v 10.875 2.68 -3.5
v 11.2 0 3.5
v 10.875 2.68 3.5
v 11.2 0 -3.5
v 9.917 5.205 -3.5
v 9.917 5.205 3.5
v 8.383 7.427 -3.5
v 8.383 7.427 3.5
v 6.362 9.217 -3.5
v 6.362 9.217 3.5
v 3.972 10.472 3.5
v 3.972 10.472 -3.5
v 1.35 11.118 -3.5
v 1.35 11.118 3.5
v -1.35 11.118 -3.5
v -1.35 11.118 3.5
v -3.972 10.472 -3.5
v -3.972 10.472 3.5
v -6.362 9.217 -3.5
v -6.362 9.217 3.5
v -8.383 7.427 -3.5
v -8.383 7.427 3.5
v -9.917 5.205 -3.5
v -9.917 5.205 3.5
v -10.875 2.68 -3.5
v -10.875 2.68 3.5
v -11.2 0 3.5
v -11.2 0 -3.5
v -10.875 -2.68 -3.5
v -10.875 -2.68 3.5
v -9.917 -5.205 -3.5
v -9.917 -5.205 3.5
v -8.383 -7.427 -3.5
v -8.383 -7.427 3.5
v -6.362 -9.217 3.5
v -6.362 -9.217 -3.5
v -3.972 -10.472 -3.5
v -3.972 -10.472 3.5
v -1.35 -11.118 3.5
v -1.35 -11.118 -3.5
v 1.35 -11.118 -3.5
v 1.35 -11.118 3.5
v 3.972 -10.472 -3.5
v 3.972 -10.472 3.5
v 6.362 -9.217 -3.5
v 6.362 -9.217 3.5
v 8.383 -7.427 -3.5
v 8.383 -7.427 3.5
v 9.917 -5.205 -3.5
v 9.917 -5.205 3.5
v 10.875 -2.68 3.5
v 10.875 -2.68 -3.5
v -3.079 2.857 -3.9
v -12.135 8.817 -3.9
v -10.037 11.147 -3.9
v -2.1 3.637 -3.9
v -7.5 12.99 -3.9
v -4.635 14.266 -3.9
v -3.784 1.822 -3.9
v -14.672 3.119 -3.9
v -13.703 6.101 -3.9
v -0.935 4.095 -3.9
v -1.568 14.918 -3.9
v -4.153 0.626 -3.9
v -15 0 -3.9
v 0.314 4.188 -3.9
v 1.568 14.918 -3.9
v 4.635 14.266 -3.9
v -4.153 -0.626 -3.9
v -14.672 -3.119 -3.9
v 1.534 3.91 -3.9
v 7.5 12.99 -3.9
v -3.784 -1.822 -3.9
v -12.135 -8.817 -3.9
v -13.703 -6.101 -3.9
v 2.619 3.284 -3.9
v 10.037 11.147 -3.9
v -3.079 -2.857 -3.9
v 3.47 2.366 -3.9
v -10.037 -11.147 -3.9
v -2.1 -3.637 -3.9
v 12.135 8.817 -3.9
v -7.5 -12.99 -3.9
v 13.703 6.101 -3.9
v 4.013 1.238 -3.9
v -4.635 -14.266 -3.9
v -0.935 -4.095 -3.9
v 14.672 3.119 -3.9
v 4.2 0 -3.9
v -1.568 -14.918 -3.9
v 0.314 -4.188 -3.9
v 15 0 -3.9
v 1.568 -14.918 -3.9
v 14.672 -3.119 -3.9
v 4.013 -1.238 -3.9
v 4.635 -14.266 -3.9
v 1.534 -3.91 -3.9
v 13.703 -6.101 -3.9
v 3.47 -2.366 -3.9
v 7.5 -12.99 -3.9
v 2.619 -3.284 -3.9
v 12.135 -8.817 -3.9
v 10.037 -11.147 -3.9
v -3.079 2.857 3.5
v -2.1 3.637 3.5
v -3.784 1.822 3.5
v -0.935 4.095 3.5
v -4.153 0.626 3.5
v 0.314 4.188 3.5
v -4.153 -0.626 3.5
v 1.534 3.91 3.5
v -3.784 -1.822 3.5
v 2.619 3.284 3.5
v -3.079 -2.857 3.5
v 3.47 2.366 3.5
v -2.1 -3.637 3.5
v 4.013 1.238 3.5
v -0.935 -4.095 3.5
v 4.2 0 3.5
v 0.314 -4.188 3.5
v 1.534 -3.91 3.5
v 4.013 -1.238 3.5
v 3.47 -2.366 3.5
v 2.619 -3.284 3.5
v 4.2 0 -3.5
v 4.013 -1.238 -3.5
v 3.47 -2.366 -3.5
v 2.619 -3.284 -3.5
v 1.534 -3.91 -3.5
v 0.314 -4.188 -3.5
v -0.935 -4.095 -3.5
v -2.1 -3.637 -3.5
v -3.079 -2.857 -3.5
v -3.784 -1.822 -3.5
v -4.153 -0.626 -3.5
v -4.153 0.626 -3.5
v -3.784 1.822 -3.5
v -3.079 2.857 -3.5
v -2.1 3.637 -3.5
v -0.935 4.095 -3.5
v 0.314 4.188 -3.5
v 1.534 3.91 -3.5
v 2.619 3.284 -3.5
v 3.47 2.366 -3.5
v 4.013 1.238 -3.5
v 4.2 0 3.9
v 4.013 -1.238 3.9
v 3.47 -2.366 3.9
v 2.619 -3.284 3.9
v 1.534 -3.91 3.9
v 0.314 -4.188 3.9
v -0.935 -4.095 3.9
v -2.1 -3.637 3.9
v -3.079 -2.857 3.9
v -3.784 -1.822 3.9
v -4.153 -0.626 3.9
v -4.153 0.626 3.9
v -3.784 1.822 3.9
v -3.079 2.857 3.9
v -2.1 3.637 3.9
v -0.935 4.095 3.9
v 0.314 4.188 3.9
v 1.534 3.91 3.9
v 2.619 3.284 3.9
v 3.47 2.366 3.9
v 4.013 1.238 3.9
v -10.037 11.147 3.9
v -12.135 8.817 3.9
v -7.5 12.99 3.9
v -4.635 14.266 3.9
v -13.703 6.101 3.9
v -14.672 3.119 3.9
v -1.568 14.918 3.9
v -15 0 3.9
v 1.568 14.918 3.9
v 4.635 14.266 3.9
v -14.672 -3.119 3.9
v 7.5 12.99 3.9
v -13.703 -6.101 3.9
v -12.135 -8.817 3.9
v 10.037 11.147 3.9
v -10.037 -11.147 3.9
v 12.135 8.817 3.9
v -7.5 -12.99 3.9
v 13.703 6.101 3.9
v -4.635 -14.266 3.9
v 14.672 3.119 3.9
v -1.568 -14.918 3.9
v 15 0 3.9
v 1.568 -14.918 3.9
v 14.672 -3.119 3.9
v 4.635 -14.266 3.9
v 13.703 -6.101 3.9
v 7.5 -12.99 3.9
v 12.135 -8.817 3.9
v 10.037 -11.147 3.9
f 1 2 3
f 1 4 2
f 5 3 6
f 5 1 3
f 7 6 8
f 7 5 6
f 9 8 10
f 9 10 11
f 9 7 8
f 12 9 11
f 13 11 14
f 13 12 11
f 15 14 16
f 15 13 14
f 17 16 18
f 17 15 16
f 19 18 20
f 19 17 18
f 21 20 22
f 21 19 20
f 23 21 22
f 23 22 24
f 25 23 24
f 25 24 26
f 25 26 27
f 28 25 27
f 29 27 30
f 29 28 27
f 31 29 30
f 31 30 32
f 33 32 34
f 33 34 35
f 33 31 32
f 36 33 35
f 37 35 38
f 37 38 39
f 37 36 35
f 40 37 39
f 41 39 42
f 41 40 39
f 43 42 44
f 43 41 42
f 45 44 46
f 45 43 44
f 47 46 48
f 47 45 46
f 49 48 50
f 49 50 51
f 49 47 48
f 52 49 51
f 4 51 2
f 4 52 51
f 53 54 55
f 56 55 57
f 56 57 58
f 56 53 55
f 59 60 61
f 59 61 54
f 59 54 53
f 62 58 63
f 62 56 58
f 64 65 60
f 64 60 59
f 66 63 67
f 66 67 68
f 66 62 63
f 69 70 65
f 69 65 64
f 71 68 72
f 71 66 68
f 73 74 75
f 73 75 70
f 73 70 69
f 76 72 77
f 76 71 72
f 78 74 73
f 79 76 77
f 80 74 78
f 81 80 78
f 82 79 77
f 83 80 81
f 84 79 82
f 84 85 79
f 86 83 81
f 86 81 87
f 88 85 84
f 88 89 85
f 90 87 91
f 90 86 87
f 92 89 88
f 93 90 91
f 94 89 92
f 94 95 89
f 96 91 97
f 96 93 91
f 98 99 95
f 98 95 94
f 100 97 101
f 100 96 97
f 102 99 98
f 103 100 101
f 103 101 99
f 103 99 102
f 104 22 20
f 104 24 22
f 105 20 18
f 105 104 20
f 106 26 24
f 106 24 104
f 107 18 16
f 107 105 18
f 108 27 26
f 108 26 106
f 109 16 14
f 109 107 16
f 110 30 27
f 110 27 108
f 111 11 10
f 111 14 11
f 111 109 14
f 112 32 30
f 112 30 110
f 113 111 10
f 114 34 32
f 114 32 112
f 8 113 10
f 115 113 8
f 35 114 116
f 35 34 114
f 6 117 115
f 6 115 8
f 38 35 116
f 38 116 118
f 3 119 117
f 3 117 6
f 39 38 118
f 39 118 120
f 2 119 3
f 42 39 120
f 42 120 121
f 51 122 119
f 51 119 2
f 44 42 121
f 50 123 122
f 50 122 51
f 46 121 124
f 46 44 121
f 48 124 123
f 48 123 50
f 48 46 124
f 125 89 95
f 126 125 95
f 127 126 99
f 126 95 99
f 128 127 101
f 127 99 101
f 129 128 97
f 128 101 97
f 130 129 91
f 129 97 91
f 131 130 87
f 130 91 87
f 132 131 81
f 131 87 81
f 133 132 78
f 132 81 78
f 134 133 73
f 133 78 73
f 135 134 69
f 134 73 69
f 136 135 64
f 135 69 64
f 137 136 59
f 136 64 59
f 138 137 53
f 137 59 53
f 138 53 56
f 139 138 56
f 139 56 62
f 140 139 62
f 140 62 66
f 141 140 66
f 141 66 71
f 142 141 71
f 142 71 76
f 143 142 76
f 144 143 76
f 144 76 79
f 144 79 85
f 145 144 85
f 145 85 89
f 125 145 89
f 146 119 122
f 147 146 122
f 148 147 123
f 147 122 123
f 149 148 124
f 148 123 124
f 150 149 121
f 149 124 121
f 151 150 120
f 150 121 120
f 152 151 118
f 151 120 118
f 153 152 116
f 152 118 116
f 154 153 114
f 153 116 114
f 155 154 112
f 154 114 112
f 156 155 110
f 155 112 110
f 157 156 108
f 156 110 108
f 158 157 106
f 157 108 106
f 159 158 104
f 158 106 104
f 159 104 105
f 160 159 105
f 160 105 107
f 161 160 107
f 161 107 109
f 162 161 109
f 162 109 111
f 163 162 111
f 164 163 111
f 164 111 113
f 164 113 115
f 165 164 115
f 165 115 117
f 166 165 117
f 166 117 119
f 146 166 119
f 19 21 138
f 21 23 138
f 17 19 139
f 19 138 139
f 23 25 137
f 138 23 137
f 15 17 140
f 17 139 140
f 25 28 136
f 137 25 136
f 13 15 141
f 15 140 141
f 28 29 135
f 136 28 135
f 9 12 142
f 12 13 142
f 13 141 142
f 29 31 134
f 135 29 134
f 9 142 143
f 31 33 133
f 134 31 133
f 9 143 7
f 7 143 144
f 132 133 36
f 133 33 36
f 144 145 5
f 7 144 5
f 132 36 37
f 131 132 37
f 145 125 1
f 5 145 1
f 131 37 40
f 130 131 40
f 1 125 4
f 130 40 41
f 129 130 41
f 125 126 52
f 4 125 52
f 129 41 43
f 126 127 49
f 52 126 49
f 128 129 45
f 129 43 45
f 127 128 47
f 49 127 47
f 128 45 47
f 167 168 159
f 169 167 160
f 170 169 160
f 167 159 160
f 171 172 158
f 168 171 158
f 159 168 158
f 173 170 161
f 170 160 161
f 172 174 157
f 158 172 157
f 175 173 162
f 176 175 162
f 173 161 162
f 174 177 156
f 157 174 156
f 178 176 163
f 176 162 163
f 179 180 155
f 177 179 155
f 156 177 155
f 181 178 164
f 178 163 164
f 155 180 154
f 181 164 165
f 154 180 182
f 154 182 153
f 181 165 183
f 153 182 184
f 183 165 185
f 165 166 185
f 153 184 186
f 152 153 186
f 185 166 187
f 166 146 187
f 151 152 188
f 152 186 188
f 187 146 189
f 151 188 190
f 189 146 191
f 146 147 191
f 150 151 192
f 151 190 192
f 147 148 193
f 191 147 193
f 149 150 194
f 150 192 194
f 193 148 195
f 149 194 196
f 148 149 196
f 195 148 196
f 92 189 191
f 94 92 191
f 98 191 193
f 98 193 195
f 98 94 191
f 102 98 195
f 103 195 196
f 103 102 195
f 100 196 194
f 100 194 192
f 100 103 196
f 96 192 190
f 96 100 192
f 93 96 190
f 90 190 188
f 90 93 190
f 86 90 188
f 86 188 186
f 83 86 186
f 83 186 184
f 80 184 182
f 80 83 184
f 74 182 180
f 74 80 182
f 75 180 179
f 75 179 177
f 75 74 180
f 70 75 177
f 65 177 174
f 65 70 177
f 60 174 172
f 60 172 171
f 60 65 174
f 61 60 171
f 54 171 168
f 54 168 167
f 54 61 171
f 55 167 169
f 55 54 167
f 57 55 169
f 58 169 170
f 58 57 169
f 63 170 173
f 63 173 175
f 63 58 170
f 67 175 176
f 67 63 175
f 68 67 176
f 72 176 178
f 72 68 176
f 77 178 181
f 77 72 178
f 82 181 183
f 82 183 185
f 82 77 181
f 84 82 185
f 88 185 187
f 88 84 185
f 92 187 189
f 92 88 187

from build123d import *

# Parameters (mm, degrees)
F0_R     = 15
F0_R_2   = 11.2
F1_DEPTH = 3.5
F2_R     = 15
F3_DEPTH = 0.4
F4_R     = 4.2
F5_DEPTH = 7.801


# Not quite as in the source:
# - a pattern or mirror of a feature is missing from the dataset's text; its kind, count and spacing are read off the source's solid


with BuildPart() as f1:
    # F0 (on Top) → F1 (new body, symmetric)
    with BuildSketch(Plane.XY):
        Circle(F0_R)
        Circle(F0_R_2, mode=Mode.SUBTRACT)
    extrude(amount=F1_DEPTH, both=True)

    # F2 (on face) → F3 (join)
    with BuildSketch(Plane(origin=(0, 0, -3.5), x_dir=(1, 0, 0), z_dir=(0, 0, -1))):
        Circle(F2_R)
    f3 = extrude(amount=F3_DEPTH)

    # F3_copies: F3 across plane
    add(f3.mirror(Plane.XY))

    # F4 (on face) → F5 (cut, through all)
    with BuildSketch(Plane(origin=(0, 0, -3.9), x_dir=(1, 0, 0), z_dir=(0, 0, -1))):
        Circle(F4_R)
    extrude(amount=-F5_DEPTH, mode=Mode.SUBTRACT)


solid = f1.part
